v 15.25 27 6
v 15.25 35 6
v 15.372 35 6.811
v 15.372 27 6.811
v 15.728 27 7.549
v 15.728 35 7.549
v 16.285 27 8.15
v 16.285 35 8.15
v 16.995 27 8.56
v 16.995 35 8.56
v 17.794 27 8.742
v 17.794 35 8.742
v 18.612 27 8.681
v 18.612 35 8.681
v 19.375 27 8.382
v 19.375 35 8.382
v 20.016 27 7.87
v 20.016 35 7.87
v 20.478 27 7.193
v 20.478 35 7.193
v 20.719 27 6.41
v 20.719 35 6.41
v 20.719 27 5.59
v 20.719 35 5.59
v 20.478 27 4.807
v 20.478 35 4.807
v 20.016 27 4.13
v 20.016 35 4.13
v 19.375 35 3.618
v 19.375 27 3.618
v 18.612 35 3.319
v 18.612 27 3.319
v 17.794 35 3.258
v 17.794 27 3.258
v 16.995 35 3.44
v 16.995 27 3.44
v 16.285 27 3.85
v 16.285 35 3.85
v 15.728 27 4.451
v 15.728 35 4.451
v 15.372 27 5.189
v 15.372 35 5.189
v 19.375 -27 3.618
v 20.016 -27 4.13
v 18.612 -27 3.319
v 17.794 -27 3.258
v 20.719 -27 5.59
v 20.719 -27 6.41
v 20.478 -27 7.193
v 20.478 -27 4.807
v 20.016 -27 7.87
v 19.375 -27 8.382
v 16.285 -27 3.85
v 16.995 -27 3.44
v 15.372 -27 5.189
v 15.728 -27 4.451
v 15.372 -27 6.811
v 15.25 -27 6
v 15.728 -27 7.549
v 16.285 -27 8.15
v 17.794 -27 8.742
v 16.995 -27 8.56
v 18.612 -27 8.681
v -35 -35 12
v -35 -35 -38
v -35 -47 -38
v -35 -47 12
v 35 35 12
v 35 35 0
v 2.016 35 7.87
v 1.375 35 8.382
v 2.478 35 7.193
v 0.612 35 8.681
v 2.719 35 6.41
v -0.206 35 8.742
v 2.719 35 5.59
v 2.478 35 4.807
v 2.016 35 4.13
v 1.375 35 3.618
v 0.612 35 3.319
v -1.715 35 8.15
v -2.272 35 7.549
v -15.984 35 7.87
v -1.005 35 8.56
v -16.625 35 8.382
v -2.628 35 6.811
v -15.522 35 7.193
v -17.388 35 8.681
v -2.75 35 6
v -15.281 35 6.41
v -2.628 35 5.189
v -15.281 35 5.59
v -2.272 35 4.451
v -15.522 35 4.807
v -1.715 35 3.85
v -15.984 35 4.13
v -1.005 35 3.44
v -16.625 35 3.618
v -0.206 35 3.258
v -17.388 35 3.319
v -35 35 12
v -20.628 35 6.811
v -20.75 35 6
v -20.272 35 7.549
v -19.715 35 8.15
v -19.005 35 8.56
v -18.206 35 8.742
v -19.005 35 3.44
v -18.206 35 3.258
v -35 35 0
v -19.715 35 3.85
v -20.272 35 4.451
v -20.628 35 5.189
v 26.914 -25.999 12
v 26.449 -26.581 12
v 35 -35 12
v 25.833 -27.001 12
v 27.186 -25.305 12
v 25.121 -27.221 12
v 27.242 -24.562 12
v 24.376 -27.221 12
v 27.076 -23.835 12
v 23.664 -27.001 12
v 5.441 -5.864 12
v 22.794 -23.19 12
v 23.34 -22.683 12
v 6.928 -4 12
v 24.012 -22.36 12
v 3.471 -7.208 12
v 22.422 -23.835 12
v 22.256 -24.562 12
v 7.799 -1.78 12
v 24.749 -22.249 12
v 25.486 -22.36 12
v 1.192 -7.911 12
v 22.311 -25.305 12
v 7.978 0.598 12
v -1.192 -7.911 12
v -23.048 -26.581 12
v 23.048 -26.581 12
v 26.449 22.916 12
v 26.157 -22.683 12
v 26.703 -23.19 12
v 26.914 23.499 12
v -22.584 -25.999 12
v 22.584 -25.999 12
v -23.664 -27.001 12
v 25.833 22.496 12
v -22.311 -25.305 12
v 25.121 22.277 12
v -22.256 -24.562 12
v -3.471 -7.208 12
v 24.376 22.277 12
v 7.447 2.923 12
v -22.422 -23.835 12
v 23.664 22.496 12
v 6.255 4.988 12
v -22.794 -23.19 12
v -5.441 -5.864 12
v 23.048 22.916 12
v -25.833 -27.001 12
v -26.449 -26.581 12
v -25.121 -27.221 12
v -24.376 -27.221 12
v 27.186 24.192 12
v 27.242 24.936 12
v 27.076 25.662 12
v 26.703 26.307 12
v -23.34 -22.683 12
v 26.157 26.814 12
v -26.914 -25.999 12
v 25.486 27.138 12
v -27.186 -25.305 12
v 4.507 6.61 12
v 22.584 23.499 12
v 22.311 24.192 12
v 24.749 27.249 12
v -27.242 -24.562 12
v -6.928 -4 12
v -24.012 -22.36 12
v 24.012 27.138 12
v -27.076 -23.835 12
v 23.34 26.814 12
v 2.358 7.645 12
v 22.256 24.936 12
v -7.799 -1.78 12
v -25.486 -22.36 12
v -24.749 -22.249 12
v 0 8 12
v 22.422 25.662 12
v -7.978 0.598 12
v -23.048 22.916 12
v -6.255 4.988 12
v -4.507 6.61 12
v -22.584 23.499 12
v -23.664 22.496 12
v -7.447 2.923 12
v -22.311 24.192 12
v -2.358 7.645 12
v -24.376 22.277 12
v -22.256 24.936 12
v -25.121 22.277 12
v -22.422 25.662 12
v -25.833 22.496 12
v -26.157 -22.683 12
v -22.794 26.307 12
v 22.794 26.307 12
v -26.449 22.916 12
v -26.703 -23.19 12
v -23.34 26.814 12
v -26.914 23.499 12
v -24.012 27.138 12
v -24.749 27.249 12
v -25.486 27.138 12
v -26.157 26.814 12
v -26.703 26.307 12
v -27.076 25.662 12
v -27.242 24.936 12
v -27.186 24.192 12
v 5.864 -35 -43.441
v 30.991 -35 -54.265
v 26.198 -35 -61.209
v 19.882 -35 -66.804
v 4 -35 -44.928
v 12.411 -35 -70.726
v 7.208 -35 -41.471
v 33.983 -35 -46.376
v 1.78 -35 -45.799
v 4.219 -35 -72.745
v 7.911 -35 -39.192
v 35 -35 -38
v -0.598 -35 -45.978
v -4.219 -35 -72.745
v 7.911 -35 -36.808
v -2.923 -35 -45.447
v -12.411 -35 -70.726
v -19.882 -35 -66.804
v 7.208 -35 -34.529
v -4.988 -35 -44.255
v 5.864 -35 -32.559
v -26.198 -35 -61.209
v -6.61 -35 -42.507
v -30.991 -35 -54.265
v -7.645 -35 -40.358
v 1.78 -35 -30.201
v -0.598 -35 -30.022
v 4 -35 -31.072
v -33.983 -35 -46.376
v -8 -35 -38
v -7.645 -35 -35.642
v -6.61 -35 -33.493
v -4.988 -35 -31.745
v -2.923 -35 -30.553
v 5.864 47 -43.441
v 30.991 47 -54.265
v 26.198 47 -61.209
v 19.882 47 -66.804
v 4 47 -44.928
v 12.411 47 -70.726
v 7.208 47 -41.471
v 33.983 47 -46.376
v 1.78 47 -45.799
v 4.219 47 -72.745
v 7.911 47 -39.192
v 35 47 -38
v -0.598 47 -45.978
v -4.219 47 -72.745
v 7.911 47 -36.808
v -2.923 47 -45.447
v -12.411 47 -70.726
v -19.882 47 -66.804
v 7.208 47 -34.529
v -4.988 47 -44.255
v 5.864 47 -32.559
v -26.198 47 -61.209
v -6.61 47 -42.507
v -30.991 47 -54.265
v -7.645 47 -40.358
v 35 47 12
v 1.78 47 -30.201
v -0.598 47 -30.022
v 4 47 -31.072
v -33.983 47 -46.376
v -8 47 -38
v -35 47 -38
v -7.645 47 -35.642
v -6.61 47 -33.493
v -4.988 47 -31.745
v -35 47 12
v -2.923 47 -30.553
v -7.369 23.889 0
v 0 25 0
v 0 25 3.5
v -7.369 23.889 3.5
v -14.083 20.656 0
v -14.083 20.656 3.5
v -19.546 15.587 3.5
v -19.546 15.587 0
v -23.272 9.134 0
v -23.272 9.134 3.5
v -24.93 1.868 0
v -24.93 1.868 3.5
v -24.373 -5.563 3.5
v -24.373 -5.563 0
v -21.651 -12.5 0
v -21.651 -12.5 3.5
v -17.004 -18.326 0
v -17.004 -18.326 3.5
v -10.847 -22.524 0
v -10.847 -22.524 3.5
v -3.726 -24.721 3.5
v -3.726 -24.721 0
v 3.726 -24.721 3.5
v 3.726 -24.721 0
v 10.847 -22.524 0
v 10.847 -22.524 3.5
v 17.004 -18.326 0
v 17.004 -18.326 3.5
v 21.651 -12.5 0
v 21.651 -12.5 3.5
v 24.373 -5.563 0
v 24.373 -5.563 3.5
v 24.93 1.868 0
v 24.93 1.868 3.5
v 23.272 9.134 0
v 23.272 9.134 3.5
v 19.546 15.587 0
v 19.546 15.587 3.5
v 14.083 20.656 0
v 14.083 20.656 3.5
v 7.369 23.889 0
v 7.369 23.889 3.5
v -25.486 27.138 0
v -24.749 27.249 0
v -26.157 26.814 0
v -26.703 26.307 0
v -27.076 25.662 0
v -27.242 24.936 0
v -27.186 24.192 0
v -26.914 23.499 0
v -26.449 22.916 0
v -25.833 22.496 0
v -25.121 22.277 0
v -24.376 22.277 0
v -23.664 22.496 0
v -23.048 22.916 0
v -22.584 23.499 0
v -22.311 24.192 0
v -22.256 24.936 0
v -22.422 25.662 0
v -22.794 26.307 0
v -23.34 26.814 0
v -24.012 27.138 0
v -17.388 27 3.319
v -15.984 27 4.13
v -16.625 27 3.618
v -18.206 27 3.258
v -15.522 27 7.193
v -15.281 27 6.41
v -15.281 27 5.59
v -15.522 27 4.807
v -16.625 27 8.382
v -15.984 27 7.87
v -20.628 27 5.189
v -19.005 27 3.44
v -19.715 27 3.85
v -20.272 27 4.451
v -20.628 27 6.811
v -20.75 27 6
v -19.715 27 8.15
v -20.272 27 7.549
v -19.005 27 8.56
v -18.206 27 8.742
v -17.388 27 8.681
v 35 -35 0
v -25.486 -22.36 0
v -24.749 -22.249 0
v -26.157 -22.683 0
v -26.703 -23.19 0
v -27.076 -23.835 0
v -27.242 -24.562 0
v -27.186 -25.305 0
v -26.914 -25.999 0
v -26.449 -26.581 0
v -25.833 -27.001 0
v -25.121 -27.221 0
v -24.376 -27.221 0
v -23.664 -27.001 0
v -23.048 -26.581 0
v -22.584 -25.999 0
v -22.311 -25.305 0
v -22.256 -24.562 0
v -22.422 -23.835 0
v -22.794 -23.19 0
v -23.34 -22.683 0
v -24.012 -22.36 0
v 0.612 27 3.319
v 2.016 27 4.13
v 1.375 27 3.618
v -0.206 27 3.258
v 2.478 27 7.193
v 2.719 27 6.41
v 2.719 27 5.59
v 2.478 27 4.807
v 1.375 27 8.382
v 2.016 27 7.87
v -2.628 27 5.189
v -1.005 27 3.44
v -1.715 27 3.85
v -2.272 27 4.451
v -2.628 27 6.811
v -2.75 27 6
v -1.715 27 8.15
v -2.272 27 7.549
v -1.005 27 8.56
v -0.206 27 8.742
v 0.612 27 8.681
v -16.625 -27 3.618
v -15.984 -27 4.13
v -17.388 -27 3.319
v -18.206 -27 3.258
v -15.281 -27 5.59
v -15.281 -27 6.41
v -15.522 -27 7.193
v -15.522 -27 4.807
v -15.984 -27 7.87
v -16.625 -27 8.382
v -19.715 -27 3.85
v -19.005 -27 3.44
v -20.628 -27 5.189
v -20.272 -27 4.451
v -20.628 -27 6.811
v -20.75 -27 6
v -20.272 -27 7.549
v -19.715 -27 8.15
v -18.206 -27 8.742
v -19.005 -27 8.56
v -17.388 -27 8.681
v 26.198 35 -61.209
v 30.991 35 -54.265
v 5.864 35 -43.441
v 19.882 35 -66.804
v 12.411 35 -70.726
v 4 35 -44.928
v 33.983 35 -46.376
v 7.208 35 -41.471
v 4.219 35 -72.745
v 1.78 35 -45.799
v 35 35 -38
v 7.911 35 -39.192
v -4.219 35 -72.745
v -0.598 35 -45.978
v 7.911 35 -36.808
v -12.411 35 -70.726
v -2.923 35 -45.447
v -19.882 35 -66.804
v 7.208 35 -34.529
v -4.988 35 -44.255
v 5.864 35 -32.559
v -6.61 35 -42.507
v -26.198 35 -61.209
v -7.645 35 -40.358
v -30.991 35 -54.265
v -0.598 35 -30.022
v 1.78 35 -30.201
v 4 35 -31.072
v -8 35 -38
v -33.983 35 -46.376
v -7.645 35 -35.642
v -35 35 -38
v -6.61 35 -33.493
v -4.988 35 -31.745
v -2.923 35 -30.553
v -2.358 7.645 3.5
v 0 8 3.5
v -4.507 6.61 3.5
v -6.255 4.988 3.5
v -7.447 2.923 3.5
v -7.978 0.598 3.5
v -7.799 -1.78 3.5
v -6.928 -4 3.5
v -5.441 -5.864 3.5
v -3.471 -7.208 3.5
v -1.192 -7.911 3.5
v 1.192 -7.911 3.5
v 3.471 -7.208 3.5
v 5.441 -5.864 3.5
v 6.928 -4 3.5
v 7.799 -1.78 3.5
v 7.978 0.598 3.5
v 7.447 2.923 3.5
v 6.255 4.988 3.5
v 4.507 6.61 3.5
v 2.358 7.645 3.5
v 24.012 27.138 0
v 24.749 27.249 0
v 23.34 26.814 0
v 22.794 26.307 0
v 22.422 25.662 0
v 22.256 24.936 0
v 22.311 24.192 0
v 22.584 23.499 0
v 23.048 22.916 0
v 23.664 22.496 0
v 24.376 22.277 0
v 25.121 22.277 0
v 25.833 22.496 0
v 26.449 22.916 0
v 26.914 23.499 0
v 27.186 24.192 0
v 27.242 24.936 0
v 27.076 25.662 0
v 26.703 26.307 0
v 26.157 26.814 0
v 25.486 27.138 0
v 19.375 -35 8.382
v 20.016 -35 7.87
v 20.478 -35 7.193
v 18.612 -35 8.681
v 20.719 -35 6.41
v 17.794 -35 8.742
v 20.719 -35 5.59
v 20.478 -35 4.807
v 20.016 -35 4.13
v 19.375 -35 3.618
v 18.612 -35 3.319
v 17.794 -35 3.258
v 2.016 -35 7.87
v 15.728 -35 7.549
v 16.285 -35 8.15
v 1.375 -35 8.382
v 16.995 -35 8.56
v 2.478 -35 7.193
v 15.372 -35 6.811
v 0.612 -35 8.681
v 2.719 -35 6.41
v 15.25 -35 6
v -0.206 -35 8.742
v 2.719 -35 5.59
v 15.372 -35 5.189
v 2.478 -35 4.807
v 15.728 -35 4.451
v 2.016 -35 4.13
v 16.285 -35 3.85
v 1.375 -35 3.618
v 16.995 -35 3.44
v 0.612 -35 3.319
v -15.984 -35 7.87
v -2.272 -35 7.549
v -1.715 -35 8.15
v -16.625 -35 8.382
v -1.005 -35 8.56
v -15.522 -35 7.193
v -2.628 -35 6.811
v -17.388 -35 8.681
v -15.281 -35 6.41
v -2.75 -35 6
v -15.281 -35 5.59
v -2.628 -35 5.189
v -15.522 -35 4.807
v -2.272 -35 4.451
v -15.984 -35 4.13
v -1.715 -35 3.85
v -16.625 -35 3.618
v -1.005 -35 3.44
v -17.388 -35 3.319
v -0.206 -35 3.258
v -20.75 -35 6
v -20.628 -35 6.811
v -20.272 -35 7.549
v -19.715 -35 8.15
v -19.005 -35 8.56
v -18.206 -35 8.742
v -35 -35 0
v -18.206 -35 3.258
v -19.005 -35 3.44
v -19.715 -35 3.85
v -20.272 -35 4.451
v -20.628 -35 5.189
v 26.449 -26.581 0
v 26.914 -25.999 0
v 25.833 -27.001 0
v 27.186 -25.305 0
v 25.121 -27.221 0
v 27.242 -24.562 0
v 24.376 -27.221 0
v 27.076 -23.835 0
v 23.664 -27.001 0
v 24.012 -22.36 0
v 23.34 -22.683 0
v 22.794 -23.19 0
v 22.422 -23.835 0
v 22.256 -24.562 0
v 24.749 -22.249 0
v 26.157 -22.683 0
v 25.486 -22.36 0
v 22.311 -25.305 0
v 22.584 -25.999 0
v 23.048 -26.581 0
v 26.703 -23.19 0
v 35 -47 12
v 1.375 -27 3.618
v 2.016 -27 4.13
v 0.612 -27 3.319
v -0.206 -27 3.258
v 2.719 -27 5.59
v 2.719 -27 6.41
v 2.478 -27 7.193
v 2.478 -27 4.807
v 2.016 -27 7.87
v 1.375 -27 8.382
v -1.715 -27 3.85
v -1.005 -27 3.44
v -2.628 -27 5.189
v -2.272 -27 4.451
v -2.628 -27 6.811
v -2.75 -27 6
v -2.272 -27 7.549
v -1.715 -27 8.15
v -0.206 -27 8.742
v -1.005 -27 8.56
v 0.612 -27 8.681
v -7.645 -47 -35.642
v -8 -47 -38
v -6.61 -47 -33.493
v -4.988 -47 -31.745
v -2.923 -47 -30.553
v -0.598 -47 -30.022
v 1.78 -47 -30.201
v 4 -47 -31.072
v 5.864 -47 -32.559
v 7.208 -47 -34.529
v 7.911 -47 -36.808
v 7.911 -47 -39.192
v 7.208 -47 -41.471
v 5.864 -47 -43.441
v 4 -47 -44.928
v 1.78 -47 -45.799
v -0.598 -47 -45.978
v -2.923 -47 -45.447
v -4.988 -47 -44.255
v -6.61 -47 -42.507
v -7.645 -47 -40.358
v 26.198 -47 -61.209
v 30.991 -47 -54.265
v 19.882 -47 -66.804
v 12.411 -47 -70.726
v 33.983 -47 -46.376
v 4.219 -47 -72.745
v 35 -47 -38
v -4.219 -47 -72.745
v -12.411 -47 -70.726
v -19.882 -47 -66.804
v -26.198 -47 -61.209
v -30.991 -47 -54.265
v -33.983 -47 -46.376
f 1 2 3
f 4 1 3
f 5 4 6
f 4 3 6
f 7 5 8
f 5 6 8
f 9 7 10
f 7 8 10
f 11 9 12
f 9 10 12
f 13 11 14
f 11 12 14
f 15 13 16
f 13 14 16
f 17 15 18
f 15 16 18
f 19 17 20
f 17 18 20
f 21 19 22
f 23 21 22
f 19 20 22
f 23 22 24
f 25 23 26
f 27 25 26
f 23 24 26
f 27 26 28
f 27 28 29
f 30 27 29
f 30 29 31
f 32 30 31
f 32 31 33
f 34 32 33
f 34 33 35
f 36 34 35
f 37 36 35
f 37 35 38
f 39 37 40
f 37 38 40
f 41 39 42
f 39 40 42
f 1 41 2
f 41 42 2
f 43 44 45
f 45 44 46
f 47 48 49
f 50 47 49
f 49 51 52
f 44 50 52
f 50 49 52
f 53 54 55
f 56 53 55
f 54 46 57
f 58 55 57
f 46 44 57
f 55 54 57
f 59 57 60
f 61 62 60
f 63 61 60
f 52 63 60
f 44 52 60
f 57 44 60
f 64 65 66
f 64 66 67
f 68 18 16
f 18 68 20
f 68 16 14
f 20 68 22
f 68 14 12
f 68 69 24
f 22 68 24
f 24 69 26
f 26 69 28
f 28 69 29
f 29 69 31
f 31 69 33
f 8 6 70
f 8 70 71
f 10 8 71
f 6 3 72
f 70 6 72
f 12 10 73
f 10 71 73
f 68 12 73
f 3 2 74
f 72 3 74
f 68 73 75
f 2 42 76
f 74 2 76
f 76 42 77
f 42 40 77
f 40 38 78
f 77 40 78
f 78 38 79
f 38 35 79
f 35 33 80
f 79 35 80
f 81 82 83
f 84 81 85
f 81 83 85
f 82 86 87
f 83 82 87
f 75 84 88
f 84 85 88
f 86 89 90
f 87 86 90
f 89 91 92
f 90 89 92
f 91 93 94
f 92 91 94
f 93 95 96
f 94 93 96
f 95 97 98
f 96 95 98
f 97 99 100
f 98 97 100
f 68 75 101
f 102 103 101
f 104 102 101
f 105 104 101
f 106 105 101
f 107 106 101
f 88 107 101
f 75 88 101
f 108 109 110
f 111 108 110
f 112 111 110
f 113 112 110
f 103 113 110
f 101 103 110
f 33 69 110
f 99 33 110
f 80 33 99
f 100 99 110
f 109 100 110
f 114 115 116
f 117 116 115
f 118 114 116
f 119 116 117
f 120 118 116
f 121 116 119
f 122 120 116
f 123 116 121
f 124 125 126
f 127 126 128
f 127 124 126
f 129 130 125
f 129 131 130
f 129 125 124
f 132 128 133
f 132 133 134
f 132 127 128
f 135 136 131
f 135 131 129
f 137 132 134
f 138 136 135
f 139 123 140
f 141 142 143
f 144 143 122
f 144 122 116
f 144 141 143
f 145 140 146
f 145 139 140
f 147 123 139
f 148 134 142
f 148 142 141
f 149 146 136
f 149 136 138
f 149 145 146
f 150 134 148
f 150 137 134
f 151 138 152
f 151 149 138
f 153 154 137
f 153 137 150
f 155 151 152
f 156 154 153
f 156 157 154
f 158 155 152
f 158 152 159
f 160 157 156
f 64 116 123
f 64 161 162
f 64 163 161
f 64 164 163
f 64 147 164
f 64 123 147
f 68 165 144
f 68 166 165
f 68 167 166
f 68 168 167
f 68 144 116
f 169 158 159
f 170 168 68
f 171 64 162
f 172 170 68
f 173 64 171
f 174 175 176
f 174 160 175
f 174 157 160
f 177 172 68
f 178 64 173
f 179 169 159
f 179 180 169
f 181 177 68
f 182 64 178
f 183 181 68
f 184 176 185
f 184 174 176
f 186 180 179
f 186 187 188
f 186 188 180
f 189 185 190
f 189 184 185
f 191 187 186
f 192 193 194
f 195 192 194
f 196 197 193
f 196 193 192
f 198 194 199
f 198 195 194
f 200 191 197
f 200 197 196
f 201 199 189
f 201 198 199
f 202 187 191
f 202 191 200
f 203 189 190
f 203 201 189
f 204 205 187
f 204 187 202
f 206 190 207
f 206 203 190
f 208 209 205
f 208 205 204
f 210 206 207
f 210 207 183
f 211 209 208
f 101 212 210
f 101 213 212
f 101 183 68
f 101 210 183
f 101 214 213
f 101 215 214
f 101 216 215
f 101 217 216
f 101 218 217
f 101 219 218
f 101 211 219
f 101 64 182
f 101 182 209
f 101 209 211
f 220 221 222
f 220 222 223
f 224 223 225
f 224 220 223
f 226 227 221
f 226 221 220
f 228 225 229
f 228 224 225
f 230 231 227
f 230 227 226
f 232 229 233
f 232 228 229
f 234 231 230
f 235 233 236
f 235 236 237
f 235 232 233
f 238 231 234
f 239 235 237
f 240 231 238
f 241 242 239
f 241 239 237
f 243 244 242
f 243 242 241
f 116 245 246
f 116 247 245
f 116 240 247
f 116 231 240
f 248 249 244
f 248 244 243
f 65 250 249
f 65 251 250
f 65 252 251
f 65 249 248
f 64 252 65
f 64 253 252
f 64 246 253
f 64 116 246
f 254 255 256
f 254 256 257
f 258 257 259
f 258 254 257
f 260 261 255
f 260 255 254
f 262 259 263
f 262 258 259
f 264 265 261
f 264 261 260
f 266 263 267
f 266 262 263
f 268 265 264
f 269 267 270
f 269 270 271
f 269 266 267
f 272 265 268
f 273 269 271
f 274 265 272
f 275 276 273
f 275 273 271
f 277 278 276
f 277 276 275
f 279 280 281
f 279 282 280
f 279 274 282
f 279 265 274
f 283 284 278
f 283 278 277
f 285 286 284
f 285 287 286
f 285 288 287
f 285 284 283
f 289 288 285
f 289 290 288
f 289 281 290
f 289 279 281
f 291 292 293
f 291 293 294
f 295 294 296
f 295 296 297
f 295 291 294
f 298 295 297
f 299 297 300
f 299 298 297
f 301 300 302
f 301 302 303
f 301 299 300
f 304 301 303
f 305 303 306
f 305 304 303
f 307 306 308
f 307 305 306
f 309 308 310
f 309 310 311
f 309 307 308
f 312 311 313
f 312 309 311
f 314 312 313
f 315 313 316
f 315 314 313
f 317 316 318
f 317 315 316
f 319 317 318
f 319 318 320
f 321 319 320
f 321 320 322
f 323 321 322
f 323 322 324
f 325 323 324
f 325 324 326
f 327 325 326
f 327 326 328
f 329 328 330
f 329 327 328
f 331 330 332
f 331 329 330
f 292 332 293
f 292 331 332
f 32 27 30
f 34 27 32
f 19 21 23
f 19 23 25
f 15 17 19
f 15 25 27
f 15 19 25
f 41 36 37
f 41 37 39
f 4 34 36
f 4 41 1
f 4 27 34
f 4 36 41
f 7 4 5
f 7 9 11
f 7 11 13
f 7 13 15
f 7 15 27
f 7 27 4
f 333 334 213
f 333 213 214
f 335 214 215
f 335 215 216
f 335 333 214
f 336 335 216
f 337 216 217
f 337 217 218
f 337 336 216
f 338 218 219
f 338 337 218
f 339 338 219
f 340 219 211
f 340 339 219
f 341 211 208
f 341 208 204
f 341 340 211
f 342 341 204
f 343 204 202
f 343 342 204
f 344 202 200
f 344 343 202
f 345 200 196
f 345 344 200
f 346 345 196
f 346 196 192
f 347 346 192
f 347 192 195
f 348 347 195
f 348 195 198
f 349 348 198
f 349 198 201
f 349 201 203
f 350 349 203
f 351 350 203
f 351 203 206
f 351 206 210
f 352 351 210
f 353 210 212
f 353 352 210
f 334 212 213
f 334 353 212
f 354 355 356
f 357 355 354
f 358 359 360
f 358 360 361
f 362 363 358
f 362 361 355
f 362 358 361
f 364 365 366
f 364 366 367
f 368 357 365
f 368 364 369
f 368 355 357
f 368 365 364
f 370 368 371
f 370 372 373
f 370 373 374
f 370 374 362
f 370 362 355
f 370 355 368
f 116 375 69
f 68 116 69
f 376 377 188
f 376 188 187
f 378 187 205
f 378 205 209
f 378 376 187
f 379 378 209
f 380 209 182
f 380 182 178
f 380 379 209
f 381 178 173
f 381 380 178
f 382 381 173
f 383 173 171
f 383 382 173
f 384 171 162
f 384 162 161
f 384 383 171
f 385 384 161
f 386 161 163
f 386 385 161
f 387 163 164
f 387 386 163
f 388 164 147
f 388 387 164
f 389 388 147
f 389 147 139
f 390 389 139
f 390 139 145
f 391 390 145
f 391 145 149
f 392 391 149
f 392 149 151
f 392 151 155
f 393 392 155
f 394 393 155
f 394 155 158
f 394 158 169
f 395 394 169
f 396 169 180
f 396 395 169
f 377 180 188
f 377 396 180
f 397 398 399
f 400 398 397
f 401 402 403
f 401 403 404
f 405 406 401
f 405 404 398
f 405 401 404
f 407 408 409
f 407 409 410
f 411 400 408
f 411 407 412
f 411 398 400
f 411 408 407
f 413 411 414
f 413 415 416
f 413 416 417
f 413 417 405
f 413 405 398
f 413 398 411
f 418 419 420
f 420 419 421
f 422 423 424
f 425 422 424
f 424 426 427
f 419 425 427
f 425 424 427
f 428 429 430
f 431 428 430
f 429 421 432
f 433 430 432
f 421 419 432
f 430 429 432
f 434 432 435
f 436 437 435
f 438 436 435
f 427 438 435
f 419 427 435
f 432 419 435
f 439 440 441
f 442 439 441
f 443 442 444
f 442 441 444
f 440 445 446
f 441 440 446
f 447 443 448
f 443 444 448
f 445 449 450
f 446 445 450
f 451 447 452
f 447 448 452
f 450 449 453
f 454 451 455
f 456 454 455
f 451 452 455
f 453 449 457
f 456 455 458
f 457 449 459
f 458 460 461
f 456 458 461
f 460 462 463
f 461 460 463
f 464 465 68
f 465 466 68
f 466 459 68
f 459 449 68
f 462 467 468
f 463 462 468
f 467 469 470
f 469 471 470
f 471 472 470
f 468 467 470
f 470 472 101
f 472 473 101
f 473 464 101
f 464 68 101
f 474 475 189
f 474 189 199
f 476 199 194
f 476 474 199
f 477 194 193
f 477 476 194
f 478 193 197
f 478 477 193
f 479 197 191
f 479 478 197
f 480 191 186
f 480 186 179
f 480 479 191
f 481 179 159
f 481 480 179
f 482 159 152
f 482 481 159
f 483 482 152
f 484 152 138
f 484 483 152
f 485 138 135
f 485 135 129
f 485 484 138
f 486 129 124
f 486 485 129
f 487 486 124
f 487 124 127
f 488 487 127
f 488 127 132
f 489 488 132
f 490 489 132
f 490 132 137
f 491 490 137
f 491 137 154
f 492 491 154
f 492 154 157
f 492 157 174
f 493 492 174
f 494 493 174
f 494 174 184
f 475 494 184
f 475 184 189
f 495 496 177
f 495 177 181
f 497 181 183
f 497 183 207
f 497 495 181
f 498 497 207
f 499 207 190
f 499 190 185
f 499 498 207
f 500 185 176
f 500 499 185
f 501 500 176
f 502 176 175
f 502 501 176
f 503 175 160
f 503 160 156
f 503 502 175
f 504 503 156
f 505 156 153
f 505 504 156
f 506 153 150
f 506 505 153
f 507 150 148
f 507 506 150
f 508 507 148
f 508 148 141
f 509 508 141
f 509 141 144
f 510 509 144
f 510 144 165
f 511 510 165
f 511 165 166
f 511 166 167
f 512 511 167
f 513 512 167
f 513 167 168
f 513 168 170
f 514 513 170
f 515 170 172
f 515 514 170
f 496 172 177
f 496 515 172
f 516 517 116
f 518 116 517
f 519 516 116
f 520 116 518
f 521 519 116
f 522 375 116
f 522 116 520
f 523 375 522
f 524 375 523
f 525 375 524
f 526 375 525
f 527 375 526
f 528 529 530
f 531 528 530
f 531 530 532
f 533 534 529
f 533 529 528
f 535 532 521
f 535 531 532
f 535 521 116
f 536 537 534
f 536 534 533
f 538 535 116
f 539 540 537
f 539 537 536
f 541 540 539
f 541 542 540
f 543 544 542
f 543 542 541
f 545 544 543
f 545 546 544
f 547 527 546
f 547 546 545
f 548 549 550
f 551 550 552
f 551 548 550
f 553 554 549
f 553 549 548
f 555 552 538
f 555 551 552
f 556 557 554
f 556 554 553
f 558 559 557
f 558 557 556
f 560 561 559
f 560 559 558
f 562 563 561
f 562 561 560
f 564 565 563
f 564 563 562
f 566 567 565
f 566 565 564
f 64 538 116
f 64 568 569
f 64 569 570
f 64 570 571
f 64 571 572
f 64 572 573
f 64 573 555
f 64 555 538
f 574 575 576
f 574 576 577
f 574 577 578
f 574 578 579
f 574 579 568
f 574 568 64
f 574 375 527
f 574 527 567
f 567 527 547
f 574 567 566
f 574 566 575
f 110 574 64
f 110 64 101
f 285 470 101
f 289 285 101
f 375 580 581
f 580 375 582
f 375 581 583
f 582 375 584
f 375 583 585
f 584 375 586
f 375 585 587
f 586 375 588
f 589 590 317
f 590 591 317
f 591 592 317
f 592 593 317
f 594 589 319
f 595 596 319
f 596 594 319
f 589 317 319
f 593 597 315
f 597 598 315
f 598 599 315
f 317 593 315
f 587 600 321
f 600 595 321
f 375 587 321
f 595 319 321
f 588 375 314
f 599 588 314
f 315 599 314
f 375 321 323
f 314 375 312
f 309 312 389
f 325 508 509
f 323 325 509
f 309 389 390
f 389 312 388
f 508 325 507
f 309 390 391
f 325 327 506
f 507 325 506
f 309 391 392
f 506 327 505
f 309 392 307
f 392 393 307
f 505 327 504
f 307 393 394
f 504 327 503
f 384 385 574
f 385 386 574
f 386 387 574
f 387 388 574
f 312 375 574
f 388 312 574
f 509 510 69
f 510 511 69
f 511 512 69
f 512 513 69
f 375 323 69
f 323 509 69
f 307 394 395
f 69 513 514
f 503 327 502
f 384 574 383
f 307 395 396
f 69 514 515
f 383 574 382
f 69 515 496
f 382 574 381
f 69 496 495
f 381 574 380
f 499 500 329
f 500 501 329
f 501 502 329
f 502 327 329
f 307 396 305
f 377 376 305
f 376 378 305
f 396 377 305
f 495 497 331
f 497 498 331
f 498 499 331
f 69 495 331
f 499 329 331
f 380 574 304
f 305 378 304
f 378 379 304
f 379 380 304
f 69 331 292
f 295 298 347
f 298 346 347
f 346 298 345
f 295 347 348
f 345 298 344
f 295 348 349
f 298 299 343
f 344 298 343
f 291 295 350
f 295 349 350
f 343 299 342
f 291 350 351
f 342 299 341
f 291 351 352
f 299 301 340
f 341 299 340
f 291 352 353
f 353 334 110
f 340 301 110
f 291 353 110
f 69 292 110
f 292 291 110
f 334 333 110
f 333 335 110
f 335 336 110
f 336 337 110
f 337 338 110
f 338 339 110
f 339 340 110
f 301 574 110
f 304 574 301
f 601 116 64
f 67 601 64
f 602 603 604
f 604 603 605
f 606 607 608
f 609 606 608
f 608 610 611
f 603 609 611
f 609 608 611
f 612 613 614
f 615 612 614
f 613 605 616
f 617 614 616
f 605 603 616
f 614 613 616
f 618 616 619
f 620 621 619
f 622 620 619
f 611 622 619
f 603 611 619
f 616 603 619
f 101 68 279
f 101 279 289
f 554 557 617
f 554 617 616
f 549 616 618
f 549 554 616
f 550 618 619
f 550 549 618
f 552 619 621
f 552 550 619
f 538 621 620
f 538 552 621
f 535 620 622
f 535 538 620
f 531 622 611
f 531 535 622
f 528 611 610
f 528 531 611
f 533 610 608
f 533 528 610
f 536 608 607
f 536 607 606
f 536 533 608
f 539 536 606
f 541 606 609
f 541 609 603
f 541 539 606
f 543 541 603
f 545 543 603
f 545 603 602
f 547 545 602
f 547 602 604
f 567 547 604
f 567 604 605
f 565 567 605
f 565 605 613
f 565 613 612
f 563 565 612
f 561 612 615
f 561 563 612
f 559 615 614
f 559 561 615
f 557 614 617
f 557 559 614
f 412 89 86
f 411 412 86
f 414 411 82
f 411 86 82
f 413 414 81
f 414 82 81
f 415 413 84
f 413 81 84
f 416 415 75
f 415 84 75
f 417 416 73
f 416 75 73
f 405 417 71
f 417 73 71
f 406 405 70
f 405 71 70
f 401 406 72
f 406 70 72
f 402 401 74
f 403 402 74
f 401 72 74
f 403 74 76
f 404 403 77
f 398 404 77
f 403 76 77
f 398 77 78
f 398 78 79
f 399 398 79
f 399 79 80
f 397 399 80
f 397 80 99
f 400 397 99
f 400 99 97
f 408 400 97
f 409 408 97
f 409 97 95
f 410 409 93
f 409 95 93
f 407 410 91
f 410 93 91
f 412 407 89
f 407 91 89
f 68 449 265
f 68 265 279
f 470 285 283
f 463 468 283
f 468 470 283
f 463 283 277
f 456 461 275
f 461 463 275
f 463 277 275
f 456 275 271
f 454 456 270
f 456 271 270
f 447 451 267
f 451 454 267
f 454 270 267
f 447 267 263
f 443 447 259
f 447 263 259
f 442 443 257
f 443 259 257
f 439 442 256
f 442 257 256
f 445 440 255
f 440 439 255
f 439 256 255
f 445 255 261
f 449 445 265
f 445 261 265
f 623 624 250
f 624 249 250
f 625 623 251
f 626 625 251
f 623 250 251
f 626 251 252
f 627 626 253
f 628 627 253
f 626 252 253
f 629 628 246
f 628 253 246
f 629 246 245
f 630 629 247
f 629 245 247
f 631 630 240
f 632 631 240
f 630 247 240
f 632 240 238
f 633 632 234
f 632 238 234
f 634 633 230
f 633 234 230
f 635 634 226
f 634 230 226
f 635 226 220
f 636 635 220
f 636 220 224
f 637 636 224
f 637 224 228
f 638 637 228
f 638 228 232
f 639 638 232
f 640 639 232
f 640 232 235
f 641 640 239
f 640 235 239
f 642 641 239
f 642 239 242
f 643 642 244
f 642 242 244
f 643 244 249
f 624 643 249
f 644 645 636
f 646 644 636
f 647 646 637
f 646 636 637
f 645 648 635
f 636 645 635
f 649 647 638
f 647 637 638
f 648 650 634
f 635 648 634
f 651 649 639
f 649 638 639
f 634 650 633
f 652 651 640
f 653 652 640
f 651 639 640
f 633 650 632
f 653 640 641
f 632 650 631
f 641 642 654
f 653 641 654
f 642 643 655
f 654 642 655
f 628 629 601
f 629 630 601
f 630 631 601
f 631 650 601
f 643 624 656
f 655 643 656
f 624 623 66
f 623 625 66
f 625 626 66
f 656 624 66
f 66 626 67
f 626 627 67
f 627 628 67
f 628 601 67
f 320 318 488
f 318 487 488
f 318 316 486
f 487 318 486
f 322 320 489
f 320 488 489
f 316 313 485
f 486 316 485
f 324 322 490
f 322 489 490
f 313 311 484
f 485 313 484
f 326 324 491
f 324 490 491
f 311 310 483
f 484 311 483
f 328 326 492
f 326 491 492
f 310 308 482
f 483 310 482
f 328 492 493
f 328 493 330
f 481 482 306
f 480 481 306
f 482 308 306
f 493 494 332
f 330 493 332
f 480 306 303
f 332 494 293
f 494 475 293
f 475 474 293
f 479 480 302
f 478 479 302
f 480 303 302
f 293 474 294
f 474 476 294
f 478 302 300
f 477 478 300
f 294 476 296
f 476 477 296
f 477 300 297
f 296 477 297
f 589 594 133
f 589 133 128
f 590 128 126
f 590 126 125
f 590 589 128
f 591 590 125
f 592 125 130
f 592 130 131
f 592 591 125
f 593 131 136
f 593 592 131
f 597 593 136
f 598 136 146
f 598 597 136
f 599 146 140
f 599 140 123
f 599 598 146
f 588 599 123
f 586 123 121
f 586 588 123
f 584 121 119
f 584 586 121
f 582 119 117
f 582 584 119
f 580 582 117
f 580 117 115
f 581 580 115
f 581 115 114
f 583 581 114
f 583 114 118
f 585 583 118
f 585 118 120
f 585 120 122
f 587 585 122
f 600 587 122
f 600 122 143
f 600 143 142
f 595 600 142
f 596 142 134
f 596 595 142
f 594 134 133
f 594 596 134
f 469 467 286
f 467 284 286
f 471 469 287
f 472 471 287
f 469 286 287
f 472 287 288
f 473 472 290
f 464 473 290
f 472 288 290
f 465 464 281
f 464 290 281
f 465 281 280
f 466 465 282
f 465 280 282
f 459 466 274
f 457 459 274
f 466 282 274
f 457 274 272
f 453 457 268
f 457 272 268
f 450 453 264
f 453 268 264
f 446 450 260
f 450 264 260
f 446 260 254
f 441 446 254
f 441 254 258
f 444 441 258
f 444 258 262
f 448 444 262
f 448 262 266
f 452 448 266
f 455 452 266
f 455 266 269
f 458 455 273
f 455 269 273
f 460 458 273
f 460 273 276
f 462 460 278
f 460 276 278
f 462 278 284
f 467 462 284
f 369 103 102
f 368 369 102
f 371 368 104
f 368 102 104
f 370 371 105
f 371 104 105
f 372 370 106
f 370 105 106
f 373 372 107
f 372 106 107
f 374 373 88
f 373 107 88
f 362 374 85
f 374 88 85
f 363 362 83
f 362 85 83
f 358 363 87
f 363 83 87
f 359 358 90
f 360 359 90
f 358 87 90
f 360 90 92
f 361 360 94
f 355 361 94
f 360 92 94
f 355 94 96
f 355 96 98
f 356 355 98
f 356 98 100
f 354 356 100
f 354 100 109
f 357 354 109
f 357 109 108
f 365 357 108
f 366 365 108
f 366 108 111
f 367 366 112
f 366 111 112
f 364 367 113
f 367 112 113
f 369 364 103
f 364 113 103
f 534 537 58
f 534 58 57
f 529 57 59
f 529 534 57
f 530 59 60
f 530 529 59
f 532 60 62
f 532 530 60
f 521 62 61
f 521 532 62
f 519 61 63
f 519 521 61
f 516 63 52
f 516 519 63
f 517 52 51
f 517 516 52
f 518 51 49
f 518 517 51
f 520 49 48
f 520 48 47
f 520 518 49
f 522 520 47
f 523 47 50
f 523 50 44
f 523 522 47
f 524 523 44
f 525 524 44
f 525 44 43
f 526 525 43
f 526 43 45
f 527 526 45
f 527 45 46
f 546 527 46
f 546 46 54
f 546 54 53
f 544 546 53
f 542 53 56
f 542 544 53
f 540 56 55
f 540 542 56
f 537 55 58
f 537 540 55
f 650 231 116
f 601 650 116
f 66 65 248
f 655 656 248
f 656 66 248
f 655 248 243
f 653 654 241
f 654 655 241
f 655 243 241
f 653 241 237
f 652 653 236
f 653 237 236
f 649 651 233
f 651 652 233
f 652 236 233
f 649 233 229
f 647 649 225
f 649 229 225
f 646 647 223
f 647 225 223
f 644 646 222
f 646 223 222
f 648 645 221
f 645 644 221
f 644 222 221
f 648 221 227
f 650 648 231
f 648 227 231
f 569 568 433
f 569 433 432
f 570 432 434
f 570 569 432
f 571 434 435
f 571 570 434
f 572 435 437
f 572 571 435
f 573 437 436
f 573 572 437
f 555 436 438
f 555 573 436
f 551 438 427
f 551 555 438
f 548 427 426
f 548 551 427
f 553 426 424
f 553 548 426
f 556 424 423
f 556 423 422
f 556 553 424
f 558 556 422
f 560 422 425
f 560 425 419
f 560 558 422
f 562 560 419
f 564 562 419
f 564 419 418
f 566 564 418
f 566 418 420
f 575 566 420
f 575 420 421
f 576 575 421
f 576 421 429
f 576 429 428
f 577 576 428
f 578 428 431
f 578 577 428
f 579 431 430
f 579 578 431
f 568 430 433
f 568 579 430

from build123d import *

# Parameters (mm, degrees)
SKETCH1_W               = 70
SKETCH1_H               = 70
SKETCH1_R               = 2.5
SKETCH1_R_2             = 25
SKETCH1_R_3             = 8
BOSS_EXTRUDE2_DEPTH     = 12
SKETCH1_5_R             = 25
CUT_EXTRUDE2_DEPTH      = 3.5
SKETCH2_R               = 2.75
CUT_EXTRUDE3_DEPTH      = 8
SKETCH3_W               = 70
SKETCH3_H               = 100
BOSS_EXTRUDE3_DEPTH     = 12
SKETCH5_R               = 8
CUT_EXTRUDE4_DEPTH      = 1
CUT_EXTRUDE4_DEPTH_BACK = 95
CUT_EXTRUDE5_DEPTH      = 1
CUT_EXTRUDE5_DEPTH_BACK = 95


with BuildPart() as part:
    # Sketch1 → Boss-Extrude2 (new body)
    with BuildSketch(Plane(origin=(0, 0, 0), x_dir=(0, 1, 0), z_dir=(0, 0, 1))):
        Rectangle(SKETCH1_W, SKETCH1_H)
        with Locations((-24.748737342, -24.748737342)):
            Circle(SKETCH1_R, mode=Mode.SUBTRACT)
        with Locations((24.748737342, -24.748737342)):
            Circle(SKETCH1_R, mode=Mode.SUBTRACT)
        with Locations((24.748737342, 24.748737342)):
            Circle(SKETCH1_R, mode=Mode.SUBTRACT)
        with Locations((-24.748737342, 24.748737342)):
            Circle(SKETCH1_R, mode=Mode.SUBTRACT)
        Circle(SKETCH1_R_2, mode=Mode.SUBTRACT)
        Circle(SKETCH1_R_2)
        Circle(SKETCH1_R_3, mode=Mode.SUBTRACT)
    extrude(amount=BOSS_EXTRUDE2_DEPTH)

    # Sketch1<5> → Cut-Extrude2 (cut)
    with BuildSketch(Plane(origin=(0, 0, 0), x_dir=(0, 1, 0), z_dir=(0, 0, 1))):
        Circle(SKETCH1_5_R)
    extrude(amount=CUT_EXTRUDE2_DEPTH, mode=Mode.SUBTRACT)

    # Sketch2 → Cut-Extrude3 (cut)
    with BuildSketch(Plane(origin=(0, 35, 0), x_dir=(-1, 0, 0), z_dir=(0, 1, 0))):
        with Locations((0, 6)):
            Circle(SKETCH2_R)
        with Locations((18, 6)):
            Circle(SKETCH2_R)
        with Locations((-18, 6)):
            Circle(SKETCH2_R)
    cut_extrude3 = extrude(amount=-CUT_EXTRUDE3_DEPTH, mode=Mode.SUBTRACT)

    # Mirror2: Cut-Extrude3 across plane
    add(cut_extrude3.mirror(Plane.ZX), mode=Mode.SUBTRACT)


with BuildPart() as body_2:
    # Sketch3 → Boss-Extrude3 (new body)
    with BuildSketch(Plane(origin=(0, 35, 0), x_dir=(-1, 0, 0), z_dir=(0, 1, 0))):
        with Locations((0, -38)):
            Rectangle(SKETCH3_W, SKETCH3_H)
    extrude(amount=BOSS_EXTRUDE3_DEPTH)


with BuildPart() as body_3:
    # Mirror1: mirrored copy
    add(body_2.part.mirror(Plane.ZX))


with BuildPart() as cut_extrude4_tool:
    # Sketch5 → Cut-Extrude4 (new body, two sides)
    with BuildSketch(Plane(origin=(0, 47, 0), x_dir=(-1, 0, 0), z_dir=(0, 1, 0))) as cut_extrude4_sk:
        with Locations((0, -38)):
            Circle(SKETCH5_R)
    extrude(amount=CUT_EXTRUDE4_DEPTH)
    extrude(cut_extrude4_sk.sketch, amount=-CUT_EXTRUDE4_DEPTH_BACK)


with BuildPart() as body_2_1:
    add(body_2.part)

    # Cut-Extrude4: cut by cut_extrude4_tool
    add(cut_extrude4_tool.part, mode=Mode.SUBTRACT)


with BuildPart() as body_3_1:
    add(body_3.part)

    # Cut-Extrude4: cut by cut_extrude4_tool
    add(cut_extrude4_tool.part, mode=Mode.SUBTRACT)


with BuildPart() as cut_extrude5_tool:
    # Sketch6 → Cut-Extrude5 (new body, two sides)
    with BuildSketch(Plane(origin=(0, 47, 0), x_dir=(-1, 0, 0), z_dir=(0, 1, 0))) as cut_extrude5_sk:
        with BuildLine():
            Line((-35, -38), (-35, -88))
            Line((-35, -88), (35, -88))
            Line((35, -88), (35, -38))
            ThreePointArc((35, -38), (0, -73), (-35, -38))
        make_face()
    extrude(amount=CUT_EXTRUDE5_DEPTH)
    extrude(cut_extrude5_sk.sketch, amount=-CUT_EXTRUDE5_DEPTH_BACK)


with BuildPart() as body_2_2:
    add(body_2_1.part)

    # Cut-Extrude5: cut by cut_extrude5_tool
    add(cut_extrude5_tool.part, mode=Mode.SUBTRACT)


with BuildPart() as body_3_2:
    add(body_3_1.part)

    # Cut-Extrude5: cut by cut_extrude5_tool
    add(cut_extrude5_tool.part, mode=Mode.SUBTRACT)


solid = Compound([part.part, body_2_2.part, body_3_2.part])
